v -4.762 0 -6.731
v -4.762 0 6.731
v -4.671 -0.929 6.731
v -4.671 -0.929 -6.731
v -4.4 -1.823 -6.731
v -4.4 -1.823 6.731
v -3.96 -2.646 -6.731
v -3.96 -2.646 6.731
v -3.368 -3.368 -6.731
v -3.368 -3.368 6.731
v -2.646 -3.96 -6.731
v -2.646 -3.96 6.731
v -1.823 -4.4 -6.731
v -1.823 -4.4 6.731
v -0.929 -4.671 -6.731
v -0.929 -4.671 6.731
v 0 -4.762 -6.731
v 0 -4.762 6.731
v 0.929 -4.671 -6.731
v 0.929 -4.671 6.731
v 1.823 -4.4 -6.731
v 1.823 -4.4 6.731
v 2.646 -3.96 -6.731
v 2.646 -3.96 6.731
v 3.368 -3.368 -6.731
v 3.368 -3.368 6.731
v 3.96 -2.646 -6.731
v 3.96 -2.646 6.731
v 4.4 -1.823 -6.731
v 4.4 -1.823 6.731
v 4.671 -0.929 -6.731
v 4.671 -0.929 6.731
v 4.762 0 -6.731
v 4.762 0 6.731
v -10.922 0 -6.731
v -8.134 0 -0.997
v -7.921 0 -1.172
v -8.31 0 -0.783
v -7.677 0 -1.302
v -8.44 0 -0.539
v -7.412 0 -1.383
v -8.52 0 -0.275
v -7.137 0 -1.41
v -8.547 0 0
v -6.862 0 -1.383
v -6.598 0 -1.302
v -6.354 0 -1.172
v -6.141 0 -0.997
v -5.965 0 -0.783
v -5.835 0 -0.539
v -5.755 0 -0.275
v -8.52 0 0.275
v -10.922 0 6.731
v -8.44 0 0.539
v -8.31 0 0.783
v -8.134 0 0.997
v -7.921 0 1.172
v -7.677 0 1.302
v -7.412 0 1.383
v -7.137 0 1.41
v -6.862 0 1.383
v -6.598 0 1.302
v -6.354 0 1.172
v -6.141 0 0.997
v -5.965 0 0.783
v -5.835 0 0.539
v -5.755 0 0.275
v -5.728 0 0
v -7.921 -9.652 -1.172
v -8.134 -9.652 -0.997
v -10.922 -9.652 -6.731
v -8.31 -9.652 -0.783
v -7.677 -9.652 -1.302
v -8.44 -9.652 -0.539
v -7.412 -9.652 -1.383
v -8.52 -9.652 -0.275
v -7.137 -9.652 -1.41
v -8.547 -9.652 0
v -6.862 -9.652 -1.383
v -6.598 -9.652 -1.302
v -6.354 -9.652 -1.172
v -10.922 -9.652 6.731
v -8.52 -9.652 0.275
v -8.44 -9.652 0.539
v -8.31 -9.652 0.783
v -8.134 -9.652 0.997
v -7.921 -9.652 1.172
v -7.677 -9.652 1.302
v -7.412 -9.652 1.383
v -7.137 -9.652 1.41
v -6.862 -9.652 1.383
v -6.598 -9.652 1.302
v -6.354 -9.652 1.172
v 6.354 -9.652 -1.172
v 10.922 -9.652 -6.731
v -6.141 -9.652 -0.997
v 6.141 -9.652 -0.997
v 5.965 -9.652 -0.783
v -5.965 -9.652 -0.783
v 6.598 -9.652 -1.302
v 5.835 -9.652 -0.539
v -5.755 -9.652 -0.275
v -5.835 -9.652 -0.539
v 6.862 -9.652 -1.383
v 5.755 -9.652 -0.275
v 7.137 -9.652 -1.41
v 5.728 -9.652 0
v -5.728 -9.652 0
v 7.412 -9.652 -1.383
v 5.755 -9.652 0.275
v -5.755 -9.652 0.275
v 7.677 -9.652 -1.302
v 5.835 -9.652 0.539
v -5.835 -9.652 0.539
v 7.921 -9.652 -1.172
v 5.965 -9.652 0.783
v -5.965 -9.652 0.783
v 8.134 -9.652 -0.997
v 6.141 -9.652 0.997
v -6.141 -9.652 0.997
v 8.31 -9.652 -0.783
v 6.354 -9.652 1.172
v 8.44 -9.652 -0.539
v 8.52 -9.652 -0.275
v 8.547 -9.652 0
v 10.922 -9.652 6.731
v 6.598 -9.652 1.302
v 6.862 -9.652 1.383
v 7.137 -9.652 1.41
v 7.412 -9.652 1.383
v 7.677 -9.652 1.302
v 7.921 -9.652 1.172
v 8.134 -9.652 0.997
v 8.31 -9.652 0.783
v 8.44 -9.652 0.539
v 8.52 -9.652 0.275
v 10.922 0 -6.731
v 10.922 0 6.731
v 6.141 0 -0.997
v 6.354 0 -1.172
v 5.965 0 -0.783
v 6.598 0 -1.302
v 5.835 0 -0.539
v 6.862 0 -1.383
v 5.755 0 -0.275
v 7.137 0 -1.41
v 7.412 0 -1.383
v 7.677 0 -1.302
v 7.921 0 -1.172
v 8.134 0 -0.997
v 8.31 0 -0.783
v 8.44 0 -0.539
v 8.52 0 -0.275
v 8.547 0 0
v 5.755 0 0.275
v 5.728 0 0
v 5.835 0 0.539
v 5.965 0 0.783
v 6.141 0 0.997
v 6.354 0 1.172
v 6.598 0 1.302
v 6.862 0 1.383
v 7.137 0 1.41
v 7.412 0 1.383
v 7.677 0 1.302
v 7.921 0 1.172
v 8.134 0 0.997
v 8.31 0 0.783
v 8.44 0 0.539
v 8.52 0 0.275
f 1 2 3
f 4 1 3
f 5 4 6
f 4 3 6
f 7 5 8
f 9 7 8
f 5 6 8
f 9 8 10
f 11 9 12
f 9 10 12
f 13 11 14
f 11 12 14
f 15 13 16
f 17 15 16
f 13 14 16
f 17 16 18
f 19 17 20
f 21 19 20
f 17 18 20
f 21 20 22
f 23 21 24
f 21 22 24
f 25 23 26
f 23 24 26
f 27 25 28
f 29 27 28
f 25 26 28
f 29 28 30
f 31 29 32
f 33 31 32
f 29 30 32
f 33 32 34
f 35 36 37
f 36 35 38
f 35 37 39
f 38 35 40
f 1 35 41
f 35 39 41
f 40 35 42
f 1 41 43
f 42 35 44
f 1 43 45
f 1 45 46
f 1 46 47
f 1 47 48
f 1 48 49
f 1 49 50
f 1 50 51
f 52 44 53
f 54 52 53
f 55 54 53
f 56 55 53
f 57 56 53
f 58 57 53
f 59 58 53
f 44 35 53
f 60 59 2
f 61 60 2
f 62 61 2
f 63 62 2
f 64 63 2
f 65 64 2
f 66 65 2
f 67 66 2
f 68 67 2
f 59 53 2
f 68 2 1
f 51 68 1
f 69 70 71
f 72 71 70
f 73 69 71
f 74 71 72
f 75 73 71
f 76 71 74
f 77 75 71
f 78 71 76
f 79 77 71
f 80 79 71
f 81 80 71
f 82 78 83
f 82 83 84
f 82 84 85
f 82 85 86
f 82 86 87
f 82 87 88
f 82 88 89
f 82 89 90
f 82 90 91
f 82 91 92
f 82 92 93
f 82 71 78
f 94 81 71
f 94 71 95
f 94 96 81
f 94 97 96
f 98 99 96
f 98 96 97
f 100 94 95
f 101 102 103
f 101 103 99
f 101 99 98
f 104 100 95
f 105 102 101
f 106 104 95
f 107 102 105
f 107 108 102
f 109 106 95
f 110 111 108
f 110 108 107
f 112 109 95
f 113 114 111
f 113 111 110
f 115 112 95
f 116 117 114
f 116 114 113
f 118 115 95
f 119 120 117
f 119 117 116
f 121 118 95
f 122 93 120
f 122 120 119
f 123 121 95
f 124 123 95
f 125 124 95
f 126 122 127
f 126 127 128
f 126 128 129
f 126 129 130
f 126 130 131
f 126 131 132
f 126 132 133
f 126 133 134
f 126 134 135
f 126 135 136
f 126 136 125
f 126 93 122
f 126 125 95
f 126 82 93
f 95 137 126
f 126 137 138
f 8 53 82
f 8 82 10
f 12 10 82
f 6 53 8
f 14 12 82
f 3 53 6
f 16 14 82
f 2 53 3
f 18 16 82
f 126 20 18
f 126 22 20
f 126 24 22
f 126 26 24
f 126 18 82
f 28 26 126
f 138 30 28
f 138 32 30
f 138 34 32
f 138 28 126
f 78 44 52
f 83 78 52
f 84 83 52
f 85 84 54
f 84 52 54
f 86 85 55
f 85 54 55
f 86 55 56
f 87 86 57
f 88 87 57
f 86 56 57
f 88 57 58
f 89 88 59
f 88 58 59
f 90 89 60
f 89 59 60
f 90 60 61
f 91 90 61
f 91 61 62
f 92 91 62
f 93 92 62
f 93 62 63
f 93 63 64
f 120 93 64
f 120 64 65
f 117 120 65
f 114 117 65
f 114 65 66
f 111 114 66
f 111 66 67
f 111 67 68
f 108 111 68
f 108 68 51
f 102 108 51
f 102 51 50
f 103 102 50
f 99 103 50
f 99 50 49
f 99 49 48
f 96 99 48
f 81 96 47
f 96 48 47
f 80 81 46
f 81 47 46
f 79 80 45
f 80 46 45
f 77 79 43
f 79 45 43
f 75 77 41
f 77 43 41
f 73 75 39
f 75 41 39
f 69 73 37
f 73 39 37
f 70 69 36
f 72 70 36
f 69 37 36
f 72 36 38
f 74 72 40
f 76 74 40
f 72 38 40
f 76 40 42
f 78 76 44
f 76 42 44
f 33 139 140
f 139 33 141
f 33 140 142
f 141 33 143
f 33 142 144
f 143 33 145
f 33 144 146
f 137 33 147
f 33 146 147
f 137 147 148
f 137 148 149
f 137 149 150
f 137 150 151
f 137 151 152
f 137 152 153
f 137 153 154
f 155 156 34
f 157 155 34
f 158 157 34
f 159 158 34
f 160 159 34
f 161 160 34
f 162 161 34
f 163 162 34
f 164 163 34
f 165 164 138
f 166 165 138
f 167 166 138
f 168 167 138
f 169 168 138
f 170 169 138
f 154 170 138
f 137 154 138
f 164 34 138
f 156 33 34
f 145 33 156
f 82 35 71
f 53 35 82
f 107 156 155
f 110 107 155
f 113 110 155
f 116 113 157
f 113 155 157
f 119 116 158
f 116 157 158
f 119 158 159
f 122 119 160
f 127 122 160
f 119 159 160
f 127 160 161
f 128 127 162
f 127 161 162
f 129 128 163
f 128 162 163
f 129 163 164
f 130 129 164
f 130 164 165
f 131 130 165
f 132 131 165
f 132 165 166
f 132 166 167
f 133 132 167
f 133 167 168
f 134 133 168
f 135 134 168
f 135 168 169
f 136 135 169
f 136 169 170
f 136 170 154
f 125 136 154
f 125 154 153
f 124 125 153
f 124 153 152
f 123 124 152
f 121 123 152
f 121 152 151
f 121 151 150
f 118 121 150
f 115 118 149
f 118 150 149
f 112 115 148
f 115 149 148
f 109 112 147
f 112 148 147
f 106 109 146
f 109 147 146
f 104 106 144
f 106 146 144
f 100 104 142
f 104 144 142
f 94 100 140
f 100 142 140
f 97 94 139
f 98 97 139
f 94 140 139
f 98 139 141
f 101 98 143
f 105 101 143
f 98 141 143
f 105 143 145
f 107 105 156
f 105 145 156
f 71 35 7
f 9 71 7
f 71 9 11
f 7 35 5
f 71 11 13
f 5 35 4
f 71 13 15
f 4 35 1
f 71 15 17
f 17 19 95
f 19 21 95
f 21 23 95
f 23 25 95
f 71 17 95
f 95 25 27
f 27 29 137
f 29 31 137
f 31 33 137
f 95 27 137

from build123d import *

# Parameters (mm, degrees)
F0_W     = 21.844
F0_H     = 13.462
F1_DEPTH = 9.652
F3_D     = 2.8194
F5_DEPTH = 13.463


with BuildPart() as f1:
    # F0 (on Front) → F1 (new body)
    with BuildSketch(Plane.XZ):
        Rectangle(F0_W, F0_H)
    extrude(amount=F1_DEPTH)

    # F3 (through all)
    with Locations(Plane.XZ.offset(9.652)):
        with Locations((-7.1374, 0), (7.1374, 0)):
            Hole(F3_D / 2)

    # F4 (on face) → F5 (cut, through all)
    with BuildSketch(Plane.XY.offset(6.731)):
        with BuildLine():
            ThreePointArc((-4.7625, 0), (0, -4.7625), (4.7625, 0))
            Line((4.7625, 0), (-4.7625, 0))
        make_face()
    extrude(amount=-F5_DEPTH, mode=Mode.SUBTRACT)


solid = f1.part
